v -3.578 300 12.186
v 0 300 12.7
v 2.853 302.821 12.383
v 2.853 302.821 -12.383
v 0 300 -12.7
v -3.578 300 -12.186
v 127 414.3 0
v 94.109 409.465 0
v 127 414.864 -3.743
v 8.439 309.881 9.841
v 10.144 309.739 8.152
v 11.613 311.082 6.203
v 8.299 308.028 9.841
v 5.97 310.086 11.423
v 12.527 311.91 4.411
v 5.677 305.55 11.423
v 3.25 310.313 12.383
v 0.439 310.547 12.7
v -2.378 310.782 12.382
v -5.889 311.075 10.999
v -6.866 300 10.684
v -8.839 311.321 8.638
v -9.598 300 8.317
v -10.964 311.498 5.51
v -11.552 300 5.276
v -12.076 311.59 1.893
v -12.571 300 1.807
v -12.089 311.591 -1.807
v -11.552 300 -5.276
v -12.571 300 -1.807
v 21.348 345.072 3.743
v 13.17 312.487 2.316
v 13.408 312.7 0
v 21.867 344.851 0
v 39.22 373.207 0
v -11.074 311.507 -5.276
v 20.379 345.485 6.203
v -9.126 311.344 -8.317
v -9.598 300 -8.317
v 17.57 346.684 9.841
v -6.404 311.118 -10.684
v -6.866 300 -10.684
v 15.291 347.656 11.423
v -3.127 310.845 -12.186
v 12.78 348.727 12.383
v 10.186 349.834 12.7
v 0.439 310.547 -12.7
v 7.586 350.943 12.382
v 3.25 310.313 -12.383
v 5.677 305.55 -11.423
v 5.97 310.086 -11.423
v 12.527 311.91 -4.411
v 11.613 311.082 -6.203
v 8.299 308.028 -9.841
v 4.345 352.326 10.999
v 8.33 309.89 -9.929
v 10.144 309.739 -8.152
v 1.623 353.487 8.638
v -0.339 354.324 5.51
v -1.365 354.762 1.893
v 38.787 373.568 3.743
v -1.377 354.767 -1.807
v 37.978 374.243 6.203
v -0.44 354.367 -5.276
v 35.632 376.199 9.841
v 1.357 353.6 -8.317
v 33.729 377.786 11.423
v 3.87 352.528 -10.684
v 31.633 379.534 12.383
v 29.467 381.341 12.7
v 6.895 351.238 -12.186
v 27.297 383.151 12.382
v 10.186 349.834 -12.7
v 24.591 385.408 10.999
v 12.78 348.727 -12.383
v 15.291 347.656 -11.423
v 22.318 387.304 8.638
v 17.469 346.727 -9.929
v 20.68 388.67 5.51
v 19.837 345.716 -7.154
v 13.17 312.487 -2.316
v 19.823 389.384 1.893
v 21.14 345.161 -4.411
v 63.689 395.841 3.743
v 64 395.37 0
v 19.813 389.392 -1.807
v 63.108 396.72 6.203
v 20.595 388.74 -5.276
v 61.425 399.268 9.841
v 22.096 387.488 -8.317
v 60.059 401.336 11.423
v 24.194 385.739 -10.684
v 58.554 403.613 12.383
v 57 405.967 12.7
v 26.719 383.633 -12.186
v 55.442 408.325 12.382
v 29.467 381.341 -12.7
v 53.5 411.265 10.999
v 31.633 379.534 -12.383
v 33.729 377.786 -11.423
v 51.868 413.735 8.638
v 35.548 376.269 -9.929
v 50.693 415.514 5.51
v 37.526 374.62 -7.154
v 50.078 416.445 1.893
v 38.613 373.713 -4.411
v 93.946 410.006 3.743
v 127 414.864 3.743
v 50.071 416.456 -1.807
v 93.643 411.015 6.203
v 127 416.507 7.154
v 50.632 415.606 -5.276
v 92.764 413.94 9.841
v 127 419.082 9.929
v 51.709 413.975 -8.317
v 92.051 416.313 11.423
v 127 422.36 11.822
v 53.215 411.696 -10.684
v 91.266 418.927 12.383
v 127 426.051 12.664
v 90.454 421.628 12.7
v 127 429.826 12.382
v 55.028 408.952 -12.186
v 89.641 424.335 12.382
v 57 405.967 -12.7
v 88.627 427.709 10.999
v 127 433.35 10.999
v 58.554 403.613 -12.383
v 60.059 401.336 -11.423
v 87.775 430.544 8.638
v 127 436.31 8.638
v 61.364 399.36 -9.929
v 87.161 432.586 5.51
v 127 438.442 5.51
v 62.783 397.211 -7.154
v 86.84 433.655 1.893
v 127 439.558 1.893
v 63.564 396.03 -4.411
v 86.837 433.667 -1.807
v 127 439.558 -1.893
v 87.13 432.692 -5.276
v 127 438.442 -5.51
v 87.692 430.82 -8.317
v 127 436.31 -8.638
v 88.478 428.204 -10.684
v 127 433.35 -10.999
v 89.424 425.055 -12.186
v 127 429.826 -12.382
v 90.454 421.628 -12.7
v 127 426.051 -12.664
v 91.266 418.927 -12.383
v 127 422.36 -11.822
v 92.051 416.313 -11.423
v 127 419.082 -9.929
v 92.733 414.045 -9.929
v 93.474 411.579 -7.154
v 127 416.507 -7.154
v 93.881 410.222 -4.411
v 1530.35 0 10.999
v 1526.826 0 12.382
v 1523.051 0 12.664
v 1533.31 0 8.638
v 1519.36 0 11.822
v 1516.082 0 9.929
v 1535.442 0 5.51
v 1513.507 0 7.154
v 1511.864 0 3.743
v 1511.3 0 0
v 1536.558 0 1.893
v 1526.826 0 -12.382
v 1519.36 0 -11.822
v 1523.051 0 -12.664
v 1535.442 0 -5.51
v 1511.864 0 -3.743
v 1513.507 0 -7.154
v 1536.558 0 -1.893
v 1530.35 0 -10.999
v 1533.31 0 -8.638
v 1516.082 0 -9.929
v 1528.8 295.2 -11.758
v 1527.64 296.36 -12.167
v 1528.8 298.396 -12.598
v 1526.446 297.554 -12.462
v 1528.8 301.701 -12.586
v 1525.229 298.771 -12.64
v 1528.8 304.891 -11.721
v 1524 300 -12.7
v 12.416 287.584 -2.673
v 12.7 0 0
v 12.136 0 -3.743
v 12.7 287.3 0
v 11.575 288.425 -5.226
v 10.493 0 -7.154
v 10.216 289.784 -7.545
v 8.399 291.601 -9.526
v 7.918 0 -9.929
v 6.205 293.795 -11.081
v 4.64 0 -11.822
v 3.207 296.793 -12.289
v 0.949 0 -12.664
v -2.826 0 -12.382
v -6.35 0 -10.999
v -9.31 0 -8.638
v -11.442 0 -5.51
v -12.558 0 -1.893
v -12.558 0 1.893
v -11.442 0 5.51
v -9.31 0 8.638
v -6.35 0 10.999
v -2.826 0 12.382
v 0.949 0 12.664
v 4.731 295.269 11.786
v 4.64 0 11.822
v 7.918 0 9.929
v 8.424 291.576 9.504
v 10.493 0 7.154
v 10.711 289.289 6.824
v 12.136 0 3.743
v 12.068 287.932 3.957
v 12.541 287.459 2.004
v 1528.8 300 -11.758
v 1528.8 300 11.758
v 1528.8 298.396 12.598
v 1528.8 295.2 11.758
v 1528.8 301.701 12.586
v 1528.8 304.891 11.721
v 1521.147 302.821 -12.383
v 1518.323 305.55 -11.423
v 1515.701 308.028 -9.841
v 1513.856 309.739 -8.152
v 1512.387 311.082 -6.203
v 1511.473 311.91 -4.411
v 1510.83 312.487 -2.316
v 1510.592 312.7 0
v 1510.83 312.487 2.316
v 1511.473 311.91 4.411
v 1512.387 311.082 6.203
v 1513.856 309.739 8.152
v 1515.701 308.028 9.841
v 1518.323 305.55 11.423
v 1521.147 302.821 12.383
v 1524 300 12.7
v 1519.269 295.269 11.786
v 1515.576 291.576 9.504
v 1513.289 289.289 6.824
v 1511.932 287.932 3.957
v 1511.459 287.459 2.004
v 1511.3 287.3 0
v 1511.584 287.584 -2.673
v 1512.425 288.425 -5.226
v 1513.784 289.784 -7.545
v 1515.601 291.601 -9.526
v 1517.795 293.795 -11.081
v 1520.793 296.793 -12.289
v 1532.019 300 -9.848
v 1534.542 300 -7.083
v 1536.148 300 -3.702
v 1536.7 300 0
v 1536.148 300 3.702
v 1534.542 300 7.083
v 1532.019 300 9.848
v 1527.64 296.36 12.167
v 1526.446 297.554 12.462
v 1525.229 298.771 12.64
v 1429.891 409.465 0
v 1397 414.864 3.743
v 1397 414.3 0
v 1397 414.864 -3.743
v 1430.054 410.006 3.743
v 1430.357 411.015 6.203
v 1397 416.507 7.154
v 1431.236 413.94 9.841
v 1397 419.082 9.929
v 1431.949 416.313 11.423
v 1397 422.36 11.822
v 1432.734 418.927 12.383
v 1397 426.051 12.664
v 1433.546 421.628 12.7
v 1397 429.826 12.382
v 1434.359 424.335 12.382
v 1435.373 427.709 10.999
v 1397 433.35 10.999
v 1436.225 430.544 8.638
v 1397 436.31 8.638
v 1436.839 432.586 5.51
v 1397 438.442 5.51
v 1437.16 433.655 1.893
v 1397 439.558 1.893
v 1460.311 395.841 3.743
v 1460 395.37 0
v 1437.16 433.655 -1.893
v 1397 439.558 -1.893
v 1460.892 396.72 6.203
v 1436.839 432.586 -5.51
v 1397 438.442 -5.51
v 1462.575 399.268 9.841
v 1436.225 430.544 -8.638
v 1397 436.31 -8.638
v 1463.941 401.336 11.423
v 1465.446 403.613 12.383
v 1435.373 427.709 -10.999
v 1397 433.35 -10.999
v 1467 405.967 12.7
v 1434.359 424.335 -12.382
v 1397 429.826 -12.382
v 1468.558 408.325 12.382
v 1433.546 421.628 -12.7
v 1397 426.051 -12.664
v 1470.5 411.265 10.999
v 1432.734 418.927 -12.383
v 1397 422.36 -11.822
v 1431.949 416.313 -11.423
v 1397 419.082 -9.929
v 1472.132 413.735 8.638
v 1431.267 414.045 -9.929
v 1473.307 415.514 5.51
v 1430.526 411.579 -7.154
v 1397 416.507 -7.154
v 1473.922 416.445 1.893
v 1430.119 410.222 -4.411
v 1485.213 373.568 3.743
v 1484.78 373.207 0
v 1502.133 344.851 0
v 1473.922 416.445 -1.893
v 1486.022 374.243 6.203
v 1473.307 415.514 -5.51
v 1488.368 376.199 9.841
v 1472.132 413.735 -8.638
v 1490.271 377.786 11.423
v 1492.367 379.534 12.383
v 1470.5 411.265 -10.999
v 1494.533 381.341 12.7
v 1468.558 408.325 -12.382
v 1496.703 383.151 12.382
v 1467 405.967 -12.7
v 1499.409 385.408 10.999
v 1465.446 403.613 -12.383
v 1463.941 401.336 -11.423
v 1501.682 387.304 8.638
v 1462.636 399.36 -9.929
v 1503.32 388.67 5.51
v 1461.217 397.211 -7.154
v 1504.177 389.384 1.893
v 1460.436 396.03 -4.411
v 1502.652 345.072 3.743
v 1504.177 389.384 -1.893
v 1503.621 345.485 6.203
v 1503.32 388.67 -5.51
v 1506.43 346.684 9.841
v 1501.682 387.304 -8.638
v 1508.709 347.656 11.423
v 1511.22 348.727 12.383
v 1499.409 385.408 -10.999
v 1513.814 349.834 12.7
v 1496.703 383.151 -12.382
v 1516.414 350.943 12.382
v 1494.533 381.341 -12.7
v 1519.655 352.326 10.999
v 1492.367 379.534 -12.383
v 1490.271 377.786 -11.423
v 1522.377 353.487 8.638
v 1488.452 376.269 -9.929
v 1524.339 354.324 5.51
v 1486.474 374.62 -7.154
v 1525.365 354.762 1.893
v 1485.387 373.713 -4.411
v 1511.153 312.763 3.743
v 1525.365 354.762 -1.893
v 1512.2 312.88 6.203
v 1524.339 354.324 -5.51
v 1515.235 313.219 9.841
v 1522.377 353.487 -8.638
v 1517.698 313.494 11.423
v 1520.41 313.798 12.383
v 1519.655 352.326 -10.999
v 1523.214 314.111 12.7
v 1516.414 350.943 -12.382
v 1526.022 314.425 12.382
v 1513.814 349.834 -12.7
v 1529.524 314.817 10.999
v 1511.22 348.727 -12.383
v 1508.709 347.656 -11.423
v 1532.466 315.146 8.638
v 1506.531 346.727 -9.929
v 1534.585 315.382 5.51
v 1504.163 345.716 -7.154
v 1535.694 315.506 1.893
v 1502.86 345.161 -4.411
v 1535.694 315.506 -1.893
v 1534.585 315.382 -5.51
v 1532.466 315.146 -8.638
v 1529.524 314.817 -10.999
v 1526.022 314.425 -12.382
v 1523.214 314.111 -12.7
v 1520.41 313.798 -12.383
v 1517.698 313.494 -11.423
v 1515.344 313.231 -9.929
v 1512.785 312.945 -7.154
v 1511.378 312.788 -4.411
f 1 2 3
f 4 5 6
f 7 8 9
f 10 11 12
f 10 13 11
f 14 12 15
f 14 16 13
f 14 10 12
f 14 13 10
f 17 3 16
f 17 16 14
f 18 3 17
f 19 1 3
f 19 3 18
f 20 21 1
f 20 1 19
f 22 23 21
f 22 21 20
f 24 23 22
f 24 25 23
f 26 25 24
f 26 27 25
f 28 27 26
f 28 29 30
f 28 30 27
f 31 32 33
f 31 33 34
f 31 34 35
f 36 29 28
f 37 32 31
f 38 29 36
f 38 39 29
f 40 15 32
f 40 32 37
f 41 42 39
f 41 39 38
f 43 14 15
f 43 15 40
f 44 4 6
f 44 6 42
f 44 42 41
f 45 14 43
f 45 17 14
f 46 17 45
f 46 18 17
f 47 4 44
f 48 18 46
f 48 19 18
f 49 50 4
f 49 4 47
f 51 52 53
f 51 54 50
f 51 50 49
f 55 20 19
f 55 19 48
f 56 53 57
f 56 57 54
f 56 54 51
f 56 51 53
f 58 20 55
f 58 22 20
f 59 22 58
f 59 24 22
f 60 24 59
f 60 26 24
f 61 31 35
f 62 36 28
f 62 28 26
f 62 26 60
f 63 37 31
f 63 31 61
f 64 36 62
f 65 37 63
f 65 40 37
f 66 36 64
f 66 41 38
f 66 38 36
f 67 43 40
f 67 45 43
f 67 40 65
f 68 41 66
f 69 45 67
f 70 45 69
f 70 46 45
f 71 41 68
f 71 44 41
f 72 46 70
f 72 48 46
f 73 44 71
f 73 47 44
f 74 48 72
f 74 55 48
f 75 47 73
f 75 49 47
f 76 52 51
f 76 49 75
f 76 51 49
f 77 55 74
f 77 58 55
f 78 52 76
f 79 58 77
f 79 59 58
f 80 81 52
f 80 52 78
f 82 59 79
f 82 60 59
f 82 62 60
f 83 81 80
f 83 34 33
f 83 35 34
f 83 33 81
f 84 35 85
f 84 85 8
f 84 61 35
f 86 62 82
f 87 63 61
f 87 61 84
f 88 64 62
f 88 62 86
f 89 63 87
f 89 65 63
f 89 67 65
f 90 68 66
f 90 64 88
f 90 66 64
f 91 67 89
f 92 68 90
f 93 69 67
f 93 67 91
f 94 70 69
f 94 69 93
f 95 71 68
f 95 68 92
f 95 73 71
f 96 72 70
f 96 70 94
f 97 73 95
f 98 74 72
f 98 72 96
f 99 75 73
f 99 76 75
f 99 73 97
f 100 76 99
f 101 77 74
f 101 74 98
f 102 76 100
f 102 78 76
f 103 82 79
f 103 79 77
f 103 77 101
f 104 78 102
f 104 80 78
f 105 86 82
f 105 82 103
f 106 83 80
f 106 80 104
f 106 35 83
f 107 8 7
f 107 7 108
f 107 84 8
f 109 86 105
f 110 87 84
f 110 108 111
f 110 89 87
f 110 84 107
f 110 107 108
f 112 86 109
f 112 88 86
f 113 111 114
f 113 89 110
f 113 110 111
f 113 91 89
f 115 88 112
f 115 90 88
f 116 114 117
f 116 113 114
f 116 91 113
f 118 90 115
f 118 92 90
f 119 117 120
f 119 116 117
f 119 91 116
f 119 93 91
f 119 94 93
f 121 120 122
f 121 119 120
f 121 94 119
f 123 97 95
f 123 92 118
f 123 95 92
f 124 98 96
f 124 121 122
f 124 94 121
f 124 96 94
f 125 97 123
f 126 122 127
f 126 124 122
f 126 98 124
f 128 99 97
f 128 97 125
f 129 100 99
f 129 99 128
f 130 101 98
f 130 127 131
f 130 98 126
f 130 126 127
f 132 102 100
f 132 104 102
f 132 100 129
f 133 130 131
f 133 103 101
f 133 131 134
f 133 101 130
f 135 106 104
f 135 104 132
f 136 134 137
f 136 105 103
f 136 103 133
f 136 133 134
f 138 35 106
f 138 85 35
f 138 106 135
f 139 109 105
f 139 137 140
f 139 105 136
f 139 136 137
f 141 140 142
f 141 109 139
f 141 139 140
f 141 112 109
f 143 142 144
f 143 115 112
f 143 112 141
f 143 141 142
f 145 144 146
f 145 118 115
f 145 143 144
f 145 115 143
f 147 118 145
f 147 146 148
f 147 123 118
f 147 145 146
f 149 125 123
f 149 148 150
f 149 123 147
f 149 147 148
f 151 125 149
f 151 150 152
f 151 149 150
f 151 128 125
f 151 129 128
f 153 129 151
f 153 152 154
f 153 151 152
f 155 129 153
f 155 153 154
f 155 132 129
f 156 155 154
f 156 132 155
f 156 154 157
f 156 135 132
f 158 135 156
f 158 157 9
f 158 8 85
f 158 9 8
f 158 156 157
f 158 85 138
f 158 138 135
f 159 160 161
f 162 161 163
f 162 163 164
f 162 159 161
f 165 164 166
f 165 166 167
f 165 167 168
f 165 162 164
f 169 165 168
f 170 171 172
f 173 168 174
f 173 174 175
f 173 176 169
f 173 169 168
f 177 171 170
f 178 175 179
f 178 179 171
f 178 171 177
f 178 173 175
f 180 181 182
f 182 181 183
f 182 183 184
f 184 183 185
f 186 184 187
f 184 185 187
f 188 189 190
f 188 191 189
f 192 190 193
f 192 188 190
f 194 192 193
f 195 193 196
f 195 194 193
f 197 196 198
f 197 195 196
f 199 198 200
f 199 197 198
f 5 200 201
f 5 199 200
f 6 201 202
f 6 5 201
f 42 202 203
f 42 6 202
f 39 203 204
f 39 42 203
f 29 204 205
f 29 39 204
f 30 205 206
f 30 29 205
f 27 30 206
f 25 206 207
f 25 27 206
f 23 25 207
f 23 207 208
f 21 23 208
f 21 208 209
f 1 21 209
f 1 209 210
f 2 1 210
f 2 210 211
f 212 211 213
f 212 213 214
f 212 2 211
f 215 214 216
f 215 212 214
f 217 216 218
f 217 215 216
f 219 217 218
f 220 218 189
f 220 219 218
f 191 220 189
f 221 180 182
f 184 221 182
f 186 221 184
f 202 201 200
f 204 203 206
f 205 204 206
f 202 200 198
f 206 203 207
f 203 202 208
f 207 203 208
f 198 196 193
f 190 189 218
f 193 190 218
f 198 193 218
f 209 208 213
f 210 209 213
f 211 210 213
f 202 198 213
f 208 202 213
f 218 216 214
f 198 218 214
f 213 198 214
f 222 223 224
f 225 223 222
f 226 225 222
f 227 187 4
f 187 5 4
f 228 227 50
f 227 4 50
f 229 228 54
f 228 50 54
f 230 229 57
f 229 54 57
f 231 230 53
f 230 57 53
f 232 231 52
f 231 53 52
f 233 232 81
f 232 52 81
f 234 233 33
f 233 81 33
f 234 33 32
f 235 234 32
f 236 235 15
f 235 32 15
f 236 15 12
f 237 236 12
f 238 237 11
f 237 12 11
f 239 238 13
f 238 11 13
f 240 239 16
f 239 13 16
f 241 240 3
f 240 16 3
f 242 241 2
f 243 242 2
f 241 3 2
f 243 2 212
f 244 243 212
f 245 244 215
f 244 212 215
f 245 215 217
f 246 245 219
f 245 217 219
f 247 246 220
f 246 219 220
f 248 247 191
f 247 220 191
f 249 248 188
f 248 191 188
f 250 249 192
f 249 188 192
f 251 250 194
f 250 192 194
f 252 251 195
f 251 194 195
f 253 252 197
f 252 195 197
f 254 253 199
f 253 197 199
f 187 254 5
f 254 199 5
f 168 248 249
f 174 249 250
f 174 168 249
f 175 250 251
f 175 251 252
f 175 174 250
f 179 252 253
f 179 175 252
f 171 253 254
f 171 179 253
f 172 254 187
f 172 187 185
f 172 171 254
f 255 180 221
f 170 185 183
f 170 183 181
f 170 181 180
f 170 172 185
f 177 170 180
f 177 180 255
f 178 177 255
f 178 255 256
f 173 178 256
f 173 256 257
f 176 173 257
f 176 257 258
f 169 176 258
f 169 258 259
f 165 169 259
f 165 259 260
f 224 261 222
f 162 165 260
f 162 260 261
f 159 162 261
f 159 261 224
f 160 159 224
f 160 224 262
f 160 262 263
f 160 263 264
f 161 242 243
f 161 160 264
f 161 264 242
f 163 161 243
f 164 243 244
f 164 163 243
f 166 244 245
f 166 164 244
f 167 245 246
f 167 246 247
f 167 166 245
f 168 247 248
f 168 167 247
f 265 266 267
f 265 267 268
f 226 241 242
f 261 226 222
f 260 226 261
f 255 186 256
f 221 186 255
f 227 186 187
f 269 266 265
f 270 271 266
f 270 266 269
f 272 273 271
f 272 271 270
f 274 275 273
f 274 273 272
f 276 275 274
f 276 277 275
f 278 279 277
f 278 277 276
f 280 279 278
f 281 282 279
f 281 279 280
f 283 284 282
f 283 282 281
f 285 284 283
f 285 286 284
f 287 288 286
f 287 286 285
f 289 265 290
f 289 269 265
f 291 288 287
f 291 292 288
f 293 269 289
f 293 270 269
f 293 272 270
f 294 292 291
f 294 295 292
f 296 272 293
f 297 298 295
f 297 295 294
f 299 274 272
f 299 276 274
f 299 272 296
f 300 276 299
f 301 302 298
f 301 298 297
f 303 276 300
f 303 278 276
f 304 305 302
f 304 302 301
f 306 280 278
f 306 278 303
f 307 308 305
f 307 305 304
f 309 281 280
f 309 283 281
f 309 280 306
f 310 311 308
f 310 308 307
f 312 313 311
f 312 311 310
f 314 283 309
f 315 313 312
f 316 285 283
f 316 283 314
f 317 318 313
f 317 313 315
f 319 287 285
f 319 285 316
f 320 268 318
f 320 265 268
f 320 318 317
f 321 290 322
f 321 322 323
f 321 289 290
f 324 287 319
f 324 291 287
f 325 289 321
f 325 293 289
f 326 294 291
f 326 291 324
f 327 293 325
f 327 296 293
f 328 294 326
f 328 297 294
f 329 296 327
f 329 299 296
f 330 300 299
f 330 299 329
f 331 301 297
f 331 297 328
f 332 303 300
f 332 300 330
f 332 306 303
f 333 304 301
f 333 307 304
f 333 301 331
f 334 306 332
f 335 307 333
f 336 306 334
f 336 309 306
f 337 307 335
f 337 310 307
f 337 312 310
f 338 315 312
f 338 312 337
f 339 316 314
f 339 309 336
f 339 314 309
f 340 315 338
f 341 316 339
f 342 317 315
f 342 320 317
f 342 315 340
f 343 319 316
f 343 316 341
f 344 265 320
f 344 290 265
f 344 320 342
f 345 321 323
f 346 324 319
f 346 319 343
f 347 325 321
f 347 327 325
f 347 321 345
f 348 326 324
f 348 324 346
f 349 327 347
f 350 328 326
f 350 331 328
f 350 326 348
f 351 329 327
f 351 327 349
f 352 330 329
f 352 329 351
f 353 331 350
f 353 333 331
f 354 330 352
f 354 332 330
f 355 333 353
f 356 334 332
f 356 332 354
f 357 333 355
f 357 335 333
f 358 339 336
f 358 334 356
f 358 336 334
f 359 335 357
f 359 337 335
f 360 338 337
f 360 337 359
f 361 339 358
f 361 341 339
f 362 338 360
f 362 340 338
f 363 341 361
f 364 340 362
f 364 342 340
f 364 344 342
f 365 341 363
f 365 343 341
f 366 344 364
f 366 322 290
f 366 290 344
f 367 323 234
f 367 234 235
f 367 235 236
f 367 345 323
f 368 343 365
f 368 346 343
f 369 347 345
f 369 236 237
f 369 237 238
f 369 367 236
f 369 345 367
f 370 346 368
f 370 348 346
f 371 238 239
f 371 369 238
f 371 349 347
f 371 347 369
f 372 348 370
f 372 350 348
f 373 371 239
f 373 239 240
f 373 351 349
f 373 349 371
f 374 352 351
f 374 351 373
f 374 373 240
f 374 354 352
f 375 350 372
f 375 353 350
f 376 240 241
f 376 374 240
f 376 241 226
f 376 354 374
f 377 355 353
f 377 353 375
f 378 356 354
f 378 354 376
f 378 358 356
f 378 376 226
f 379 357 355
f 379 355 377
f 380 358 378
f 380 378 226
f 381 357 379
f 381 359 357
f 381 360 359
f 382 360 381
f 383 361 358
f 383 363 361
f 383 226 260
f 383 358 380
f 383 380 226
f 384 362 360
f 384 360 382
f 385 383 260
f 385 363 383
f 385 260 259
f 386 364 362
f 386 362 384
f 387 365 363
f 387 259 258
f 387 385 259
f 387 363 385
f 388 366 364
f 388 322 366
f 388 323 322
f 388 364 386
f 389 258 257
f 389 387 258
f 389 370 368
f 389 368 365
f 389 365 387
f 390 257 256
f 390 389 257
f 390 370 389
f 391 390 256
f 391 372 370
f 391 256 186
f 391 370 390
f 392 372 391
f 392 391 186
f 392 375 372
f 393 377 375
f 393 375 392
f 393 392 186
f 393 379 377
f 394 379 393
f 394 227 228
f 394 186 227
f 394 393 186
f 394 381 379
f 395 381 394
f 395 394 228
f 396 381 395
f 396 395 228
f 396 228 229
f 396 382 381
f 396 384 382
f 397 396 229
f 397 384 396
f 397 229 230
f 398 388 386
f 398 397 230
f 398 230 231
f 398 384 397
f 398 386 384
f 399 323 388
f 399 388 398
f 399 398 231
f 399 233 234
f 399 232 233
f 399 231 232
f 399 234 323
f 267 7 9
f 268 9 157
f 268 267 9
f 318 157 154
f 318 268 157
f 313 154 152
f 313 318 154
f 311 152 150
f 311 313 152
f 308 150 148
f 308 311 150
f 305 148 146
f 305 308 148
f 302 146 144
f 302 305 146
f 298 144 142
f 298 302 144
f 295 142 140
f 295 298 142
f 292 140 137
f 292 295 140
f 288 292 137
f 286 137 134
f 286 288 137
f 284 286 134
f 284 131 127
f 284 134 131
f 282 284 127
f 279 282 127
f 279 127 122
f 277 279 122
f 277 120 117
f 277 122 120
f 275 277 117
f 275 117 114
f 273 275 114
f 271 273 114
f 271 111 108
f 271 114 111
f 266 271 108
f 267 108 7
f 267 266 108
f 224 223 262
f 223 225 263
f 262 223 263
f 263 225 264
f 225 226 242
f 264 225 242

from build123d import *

# Parameters (mm, degrees)
SKETCH2_R           = 12.7
SKETCH4_R           = 12.7
BOSS_EXTRUDE2_DEPTH = 1528.8


with BuildPart() as part:
    # Sweep1: sweep along a path in Sketch1
    with BuildLine(Plane.XY) as sweep1_path:
        Line((0, 0), (0, 300))
        ThreePointArc((0, 300), (37.197438789, 389.802561211), (127, 427))
        Line((127, 427), (1397, 427))
        ThreePointArc((1397, 427), (1486.802561211, 389.802561211), (1524, 300))
        Line((1524, 300), (1524, 0))
    # Sketch2 → Sweep1 (sweep)
    with BuildSketch(Plane(origin=(0, 0, 0), x_dir=(1, 0, 0), z_dir=(0, 1, 0))):
        Circle(SKETCH2_R)
    sweep(path=sweep1_path.line)

    # Sketch4 → Boss-Extrude2 (add)
    with BuildSketch(Plane(origin=(0, 0, 0), x_dir=(0, 0, -1), z_dir=(1, 0, 0))):
        with Locations((0, 300)):
            Circle(SKETCH4_R)
    extrude(amount=BOSS_EXTRUDE2_DEPTH)


solid = part.part
